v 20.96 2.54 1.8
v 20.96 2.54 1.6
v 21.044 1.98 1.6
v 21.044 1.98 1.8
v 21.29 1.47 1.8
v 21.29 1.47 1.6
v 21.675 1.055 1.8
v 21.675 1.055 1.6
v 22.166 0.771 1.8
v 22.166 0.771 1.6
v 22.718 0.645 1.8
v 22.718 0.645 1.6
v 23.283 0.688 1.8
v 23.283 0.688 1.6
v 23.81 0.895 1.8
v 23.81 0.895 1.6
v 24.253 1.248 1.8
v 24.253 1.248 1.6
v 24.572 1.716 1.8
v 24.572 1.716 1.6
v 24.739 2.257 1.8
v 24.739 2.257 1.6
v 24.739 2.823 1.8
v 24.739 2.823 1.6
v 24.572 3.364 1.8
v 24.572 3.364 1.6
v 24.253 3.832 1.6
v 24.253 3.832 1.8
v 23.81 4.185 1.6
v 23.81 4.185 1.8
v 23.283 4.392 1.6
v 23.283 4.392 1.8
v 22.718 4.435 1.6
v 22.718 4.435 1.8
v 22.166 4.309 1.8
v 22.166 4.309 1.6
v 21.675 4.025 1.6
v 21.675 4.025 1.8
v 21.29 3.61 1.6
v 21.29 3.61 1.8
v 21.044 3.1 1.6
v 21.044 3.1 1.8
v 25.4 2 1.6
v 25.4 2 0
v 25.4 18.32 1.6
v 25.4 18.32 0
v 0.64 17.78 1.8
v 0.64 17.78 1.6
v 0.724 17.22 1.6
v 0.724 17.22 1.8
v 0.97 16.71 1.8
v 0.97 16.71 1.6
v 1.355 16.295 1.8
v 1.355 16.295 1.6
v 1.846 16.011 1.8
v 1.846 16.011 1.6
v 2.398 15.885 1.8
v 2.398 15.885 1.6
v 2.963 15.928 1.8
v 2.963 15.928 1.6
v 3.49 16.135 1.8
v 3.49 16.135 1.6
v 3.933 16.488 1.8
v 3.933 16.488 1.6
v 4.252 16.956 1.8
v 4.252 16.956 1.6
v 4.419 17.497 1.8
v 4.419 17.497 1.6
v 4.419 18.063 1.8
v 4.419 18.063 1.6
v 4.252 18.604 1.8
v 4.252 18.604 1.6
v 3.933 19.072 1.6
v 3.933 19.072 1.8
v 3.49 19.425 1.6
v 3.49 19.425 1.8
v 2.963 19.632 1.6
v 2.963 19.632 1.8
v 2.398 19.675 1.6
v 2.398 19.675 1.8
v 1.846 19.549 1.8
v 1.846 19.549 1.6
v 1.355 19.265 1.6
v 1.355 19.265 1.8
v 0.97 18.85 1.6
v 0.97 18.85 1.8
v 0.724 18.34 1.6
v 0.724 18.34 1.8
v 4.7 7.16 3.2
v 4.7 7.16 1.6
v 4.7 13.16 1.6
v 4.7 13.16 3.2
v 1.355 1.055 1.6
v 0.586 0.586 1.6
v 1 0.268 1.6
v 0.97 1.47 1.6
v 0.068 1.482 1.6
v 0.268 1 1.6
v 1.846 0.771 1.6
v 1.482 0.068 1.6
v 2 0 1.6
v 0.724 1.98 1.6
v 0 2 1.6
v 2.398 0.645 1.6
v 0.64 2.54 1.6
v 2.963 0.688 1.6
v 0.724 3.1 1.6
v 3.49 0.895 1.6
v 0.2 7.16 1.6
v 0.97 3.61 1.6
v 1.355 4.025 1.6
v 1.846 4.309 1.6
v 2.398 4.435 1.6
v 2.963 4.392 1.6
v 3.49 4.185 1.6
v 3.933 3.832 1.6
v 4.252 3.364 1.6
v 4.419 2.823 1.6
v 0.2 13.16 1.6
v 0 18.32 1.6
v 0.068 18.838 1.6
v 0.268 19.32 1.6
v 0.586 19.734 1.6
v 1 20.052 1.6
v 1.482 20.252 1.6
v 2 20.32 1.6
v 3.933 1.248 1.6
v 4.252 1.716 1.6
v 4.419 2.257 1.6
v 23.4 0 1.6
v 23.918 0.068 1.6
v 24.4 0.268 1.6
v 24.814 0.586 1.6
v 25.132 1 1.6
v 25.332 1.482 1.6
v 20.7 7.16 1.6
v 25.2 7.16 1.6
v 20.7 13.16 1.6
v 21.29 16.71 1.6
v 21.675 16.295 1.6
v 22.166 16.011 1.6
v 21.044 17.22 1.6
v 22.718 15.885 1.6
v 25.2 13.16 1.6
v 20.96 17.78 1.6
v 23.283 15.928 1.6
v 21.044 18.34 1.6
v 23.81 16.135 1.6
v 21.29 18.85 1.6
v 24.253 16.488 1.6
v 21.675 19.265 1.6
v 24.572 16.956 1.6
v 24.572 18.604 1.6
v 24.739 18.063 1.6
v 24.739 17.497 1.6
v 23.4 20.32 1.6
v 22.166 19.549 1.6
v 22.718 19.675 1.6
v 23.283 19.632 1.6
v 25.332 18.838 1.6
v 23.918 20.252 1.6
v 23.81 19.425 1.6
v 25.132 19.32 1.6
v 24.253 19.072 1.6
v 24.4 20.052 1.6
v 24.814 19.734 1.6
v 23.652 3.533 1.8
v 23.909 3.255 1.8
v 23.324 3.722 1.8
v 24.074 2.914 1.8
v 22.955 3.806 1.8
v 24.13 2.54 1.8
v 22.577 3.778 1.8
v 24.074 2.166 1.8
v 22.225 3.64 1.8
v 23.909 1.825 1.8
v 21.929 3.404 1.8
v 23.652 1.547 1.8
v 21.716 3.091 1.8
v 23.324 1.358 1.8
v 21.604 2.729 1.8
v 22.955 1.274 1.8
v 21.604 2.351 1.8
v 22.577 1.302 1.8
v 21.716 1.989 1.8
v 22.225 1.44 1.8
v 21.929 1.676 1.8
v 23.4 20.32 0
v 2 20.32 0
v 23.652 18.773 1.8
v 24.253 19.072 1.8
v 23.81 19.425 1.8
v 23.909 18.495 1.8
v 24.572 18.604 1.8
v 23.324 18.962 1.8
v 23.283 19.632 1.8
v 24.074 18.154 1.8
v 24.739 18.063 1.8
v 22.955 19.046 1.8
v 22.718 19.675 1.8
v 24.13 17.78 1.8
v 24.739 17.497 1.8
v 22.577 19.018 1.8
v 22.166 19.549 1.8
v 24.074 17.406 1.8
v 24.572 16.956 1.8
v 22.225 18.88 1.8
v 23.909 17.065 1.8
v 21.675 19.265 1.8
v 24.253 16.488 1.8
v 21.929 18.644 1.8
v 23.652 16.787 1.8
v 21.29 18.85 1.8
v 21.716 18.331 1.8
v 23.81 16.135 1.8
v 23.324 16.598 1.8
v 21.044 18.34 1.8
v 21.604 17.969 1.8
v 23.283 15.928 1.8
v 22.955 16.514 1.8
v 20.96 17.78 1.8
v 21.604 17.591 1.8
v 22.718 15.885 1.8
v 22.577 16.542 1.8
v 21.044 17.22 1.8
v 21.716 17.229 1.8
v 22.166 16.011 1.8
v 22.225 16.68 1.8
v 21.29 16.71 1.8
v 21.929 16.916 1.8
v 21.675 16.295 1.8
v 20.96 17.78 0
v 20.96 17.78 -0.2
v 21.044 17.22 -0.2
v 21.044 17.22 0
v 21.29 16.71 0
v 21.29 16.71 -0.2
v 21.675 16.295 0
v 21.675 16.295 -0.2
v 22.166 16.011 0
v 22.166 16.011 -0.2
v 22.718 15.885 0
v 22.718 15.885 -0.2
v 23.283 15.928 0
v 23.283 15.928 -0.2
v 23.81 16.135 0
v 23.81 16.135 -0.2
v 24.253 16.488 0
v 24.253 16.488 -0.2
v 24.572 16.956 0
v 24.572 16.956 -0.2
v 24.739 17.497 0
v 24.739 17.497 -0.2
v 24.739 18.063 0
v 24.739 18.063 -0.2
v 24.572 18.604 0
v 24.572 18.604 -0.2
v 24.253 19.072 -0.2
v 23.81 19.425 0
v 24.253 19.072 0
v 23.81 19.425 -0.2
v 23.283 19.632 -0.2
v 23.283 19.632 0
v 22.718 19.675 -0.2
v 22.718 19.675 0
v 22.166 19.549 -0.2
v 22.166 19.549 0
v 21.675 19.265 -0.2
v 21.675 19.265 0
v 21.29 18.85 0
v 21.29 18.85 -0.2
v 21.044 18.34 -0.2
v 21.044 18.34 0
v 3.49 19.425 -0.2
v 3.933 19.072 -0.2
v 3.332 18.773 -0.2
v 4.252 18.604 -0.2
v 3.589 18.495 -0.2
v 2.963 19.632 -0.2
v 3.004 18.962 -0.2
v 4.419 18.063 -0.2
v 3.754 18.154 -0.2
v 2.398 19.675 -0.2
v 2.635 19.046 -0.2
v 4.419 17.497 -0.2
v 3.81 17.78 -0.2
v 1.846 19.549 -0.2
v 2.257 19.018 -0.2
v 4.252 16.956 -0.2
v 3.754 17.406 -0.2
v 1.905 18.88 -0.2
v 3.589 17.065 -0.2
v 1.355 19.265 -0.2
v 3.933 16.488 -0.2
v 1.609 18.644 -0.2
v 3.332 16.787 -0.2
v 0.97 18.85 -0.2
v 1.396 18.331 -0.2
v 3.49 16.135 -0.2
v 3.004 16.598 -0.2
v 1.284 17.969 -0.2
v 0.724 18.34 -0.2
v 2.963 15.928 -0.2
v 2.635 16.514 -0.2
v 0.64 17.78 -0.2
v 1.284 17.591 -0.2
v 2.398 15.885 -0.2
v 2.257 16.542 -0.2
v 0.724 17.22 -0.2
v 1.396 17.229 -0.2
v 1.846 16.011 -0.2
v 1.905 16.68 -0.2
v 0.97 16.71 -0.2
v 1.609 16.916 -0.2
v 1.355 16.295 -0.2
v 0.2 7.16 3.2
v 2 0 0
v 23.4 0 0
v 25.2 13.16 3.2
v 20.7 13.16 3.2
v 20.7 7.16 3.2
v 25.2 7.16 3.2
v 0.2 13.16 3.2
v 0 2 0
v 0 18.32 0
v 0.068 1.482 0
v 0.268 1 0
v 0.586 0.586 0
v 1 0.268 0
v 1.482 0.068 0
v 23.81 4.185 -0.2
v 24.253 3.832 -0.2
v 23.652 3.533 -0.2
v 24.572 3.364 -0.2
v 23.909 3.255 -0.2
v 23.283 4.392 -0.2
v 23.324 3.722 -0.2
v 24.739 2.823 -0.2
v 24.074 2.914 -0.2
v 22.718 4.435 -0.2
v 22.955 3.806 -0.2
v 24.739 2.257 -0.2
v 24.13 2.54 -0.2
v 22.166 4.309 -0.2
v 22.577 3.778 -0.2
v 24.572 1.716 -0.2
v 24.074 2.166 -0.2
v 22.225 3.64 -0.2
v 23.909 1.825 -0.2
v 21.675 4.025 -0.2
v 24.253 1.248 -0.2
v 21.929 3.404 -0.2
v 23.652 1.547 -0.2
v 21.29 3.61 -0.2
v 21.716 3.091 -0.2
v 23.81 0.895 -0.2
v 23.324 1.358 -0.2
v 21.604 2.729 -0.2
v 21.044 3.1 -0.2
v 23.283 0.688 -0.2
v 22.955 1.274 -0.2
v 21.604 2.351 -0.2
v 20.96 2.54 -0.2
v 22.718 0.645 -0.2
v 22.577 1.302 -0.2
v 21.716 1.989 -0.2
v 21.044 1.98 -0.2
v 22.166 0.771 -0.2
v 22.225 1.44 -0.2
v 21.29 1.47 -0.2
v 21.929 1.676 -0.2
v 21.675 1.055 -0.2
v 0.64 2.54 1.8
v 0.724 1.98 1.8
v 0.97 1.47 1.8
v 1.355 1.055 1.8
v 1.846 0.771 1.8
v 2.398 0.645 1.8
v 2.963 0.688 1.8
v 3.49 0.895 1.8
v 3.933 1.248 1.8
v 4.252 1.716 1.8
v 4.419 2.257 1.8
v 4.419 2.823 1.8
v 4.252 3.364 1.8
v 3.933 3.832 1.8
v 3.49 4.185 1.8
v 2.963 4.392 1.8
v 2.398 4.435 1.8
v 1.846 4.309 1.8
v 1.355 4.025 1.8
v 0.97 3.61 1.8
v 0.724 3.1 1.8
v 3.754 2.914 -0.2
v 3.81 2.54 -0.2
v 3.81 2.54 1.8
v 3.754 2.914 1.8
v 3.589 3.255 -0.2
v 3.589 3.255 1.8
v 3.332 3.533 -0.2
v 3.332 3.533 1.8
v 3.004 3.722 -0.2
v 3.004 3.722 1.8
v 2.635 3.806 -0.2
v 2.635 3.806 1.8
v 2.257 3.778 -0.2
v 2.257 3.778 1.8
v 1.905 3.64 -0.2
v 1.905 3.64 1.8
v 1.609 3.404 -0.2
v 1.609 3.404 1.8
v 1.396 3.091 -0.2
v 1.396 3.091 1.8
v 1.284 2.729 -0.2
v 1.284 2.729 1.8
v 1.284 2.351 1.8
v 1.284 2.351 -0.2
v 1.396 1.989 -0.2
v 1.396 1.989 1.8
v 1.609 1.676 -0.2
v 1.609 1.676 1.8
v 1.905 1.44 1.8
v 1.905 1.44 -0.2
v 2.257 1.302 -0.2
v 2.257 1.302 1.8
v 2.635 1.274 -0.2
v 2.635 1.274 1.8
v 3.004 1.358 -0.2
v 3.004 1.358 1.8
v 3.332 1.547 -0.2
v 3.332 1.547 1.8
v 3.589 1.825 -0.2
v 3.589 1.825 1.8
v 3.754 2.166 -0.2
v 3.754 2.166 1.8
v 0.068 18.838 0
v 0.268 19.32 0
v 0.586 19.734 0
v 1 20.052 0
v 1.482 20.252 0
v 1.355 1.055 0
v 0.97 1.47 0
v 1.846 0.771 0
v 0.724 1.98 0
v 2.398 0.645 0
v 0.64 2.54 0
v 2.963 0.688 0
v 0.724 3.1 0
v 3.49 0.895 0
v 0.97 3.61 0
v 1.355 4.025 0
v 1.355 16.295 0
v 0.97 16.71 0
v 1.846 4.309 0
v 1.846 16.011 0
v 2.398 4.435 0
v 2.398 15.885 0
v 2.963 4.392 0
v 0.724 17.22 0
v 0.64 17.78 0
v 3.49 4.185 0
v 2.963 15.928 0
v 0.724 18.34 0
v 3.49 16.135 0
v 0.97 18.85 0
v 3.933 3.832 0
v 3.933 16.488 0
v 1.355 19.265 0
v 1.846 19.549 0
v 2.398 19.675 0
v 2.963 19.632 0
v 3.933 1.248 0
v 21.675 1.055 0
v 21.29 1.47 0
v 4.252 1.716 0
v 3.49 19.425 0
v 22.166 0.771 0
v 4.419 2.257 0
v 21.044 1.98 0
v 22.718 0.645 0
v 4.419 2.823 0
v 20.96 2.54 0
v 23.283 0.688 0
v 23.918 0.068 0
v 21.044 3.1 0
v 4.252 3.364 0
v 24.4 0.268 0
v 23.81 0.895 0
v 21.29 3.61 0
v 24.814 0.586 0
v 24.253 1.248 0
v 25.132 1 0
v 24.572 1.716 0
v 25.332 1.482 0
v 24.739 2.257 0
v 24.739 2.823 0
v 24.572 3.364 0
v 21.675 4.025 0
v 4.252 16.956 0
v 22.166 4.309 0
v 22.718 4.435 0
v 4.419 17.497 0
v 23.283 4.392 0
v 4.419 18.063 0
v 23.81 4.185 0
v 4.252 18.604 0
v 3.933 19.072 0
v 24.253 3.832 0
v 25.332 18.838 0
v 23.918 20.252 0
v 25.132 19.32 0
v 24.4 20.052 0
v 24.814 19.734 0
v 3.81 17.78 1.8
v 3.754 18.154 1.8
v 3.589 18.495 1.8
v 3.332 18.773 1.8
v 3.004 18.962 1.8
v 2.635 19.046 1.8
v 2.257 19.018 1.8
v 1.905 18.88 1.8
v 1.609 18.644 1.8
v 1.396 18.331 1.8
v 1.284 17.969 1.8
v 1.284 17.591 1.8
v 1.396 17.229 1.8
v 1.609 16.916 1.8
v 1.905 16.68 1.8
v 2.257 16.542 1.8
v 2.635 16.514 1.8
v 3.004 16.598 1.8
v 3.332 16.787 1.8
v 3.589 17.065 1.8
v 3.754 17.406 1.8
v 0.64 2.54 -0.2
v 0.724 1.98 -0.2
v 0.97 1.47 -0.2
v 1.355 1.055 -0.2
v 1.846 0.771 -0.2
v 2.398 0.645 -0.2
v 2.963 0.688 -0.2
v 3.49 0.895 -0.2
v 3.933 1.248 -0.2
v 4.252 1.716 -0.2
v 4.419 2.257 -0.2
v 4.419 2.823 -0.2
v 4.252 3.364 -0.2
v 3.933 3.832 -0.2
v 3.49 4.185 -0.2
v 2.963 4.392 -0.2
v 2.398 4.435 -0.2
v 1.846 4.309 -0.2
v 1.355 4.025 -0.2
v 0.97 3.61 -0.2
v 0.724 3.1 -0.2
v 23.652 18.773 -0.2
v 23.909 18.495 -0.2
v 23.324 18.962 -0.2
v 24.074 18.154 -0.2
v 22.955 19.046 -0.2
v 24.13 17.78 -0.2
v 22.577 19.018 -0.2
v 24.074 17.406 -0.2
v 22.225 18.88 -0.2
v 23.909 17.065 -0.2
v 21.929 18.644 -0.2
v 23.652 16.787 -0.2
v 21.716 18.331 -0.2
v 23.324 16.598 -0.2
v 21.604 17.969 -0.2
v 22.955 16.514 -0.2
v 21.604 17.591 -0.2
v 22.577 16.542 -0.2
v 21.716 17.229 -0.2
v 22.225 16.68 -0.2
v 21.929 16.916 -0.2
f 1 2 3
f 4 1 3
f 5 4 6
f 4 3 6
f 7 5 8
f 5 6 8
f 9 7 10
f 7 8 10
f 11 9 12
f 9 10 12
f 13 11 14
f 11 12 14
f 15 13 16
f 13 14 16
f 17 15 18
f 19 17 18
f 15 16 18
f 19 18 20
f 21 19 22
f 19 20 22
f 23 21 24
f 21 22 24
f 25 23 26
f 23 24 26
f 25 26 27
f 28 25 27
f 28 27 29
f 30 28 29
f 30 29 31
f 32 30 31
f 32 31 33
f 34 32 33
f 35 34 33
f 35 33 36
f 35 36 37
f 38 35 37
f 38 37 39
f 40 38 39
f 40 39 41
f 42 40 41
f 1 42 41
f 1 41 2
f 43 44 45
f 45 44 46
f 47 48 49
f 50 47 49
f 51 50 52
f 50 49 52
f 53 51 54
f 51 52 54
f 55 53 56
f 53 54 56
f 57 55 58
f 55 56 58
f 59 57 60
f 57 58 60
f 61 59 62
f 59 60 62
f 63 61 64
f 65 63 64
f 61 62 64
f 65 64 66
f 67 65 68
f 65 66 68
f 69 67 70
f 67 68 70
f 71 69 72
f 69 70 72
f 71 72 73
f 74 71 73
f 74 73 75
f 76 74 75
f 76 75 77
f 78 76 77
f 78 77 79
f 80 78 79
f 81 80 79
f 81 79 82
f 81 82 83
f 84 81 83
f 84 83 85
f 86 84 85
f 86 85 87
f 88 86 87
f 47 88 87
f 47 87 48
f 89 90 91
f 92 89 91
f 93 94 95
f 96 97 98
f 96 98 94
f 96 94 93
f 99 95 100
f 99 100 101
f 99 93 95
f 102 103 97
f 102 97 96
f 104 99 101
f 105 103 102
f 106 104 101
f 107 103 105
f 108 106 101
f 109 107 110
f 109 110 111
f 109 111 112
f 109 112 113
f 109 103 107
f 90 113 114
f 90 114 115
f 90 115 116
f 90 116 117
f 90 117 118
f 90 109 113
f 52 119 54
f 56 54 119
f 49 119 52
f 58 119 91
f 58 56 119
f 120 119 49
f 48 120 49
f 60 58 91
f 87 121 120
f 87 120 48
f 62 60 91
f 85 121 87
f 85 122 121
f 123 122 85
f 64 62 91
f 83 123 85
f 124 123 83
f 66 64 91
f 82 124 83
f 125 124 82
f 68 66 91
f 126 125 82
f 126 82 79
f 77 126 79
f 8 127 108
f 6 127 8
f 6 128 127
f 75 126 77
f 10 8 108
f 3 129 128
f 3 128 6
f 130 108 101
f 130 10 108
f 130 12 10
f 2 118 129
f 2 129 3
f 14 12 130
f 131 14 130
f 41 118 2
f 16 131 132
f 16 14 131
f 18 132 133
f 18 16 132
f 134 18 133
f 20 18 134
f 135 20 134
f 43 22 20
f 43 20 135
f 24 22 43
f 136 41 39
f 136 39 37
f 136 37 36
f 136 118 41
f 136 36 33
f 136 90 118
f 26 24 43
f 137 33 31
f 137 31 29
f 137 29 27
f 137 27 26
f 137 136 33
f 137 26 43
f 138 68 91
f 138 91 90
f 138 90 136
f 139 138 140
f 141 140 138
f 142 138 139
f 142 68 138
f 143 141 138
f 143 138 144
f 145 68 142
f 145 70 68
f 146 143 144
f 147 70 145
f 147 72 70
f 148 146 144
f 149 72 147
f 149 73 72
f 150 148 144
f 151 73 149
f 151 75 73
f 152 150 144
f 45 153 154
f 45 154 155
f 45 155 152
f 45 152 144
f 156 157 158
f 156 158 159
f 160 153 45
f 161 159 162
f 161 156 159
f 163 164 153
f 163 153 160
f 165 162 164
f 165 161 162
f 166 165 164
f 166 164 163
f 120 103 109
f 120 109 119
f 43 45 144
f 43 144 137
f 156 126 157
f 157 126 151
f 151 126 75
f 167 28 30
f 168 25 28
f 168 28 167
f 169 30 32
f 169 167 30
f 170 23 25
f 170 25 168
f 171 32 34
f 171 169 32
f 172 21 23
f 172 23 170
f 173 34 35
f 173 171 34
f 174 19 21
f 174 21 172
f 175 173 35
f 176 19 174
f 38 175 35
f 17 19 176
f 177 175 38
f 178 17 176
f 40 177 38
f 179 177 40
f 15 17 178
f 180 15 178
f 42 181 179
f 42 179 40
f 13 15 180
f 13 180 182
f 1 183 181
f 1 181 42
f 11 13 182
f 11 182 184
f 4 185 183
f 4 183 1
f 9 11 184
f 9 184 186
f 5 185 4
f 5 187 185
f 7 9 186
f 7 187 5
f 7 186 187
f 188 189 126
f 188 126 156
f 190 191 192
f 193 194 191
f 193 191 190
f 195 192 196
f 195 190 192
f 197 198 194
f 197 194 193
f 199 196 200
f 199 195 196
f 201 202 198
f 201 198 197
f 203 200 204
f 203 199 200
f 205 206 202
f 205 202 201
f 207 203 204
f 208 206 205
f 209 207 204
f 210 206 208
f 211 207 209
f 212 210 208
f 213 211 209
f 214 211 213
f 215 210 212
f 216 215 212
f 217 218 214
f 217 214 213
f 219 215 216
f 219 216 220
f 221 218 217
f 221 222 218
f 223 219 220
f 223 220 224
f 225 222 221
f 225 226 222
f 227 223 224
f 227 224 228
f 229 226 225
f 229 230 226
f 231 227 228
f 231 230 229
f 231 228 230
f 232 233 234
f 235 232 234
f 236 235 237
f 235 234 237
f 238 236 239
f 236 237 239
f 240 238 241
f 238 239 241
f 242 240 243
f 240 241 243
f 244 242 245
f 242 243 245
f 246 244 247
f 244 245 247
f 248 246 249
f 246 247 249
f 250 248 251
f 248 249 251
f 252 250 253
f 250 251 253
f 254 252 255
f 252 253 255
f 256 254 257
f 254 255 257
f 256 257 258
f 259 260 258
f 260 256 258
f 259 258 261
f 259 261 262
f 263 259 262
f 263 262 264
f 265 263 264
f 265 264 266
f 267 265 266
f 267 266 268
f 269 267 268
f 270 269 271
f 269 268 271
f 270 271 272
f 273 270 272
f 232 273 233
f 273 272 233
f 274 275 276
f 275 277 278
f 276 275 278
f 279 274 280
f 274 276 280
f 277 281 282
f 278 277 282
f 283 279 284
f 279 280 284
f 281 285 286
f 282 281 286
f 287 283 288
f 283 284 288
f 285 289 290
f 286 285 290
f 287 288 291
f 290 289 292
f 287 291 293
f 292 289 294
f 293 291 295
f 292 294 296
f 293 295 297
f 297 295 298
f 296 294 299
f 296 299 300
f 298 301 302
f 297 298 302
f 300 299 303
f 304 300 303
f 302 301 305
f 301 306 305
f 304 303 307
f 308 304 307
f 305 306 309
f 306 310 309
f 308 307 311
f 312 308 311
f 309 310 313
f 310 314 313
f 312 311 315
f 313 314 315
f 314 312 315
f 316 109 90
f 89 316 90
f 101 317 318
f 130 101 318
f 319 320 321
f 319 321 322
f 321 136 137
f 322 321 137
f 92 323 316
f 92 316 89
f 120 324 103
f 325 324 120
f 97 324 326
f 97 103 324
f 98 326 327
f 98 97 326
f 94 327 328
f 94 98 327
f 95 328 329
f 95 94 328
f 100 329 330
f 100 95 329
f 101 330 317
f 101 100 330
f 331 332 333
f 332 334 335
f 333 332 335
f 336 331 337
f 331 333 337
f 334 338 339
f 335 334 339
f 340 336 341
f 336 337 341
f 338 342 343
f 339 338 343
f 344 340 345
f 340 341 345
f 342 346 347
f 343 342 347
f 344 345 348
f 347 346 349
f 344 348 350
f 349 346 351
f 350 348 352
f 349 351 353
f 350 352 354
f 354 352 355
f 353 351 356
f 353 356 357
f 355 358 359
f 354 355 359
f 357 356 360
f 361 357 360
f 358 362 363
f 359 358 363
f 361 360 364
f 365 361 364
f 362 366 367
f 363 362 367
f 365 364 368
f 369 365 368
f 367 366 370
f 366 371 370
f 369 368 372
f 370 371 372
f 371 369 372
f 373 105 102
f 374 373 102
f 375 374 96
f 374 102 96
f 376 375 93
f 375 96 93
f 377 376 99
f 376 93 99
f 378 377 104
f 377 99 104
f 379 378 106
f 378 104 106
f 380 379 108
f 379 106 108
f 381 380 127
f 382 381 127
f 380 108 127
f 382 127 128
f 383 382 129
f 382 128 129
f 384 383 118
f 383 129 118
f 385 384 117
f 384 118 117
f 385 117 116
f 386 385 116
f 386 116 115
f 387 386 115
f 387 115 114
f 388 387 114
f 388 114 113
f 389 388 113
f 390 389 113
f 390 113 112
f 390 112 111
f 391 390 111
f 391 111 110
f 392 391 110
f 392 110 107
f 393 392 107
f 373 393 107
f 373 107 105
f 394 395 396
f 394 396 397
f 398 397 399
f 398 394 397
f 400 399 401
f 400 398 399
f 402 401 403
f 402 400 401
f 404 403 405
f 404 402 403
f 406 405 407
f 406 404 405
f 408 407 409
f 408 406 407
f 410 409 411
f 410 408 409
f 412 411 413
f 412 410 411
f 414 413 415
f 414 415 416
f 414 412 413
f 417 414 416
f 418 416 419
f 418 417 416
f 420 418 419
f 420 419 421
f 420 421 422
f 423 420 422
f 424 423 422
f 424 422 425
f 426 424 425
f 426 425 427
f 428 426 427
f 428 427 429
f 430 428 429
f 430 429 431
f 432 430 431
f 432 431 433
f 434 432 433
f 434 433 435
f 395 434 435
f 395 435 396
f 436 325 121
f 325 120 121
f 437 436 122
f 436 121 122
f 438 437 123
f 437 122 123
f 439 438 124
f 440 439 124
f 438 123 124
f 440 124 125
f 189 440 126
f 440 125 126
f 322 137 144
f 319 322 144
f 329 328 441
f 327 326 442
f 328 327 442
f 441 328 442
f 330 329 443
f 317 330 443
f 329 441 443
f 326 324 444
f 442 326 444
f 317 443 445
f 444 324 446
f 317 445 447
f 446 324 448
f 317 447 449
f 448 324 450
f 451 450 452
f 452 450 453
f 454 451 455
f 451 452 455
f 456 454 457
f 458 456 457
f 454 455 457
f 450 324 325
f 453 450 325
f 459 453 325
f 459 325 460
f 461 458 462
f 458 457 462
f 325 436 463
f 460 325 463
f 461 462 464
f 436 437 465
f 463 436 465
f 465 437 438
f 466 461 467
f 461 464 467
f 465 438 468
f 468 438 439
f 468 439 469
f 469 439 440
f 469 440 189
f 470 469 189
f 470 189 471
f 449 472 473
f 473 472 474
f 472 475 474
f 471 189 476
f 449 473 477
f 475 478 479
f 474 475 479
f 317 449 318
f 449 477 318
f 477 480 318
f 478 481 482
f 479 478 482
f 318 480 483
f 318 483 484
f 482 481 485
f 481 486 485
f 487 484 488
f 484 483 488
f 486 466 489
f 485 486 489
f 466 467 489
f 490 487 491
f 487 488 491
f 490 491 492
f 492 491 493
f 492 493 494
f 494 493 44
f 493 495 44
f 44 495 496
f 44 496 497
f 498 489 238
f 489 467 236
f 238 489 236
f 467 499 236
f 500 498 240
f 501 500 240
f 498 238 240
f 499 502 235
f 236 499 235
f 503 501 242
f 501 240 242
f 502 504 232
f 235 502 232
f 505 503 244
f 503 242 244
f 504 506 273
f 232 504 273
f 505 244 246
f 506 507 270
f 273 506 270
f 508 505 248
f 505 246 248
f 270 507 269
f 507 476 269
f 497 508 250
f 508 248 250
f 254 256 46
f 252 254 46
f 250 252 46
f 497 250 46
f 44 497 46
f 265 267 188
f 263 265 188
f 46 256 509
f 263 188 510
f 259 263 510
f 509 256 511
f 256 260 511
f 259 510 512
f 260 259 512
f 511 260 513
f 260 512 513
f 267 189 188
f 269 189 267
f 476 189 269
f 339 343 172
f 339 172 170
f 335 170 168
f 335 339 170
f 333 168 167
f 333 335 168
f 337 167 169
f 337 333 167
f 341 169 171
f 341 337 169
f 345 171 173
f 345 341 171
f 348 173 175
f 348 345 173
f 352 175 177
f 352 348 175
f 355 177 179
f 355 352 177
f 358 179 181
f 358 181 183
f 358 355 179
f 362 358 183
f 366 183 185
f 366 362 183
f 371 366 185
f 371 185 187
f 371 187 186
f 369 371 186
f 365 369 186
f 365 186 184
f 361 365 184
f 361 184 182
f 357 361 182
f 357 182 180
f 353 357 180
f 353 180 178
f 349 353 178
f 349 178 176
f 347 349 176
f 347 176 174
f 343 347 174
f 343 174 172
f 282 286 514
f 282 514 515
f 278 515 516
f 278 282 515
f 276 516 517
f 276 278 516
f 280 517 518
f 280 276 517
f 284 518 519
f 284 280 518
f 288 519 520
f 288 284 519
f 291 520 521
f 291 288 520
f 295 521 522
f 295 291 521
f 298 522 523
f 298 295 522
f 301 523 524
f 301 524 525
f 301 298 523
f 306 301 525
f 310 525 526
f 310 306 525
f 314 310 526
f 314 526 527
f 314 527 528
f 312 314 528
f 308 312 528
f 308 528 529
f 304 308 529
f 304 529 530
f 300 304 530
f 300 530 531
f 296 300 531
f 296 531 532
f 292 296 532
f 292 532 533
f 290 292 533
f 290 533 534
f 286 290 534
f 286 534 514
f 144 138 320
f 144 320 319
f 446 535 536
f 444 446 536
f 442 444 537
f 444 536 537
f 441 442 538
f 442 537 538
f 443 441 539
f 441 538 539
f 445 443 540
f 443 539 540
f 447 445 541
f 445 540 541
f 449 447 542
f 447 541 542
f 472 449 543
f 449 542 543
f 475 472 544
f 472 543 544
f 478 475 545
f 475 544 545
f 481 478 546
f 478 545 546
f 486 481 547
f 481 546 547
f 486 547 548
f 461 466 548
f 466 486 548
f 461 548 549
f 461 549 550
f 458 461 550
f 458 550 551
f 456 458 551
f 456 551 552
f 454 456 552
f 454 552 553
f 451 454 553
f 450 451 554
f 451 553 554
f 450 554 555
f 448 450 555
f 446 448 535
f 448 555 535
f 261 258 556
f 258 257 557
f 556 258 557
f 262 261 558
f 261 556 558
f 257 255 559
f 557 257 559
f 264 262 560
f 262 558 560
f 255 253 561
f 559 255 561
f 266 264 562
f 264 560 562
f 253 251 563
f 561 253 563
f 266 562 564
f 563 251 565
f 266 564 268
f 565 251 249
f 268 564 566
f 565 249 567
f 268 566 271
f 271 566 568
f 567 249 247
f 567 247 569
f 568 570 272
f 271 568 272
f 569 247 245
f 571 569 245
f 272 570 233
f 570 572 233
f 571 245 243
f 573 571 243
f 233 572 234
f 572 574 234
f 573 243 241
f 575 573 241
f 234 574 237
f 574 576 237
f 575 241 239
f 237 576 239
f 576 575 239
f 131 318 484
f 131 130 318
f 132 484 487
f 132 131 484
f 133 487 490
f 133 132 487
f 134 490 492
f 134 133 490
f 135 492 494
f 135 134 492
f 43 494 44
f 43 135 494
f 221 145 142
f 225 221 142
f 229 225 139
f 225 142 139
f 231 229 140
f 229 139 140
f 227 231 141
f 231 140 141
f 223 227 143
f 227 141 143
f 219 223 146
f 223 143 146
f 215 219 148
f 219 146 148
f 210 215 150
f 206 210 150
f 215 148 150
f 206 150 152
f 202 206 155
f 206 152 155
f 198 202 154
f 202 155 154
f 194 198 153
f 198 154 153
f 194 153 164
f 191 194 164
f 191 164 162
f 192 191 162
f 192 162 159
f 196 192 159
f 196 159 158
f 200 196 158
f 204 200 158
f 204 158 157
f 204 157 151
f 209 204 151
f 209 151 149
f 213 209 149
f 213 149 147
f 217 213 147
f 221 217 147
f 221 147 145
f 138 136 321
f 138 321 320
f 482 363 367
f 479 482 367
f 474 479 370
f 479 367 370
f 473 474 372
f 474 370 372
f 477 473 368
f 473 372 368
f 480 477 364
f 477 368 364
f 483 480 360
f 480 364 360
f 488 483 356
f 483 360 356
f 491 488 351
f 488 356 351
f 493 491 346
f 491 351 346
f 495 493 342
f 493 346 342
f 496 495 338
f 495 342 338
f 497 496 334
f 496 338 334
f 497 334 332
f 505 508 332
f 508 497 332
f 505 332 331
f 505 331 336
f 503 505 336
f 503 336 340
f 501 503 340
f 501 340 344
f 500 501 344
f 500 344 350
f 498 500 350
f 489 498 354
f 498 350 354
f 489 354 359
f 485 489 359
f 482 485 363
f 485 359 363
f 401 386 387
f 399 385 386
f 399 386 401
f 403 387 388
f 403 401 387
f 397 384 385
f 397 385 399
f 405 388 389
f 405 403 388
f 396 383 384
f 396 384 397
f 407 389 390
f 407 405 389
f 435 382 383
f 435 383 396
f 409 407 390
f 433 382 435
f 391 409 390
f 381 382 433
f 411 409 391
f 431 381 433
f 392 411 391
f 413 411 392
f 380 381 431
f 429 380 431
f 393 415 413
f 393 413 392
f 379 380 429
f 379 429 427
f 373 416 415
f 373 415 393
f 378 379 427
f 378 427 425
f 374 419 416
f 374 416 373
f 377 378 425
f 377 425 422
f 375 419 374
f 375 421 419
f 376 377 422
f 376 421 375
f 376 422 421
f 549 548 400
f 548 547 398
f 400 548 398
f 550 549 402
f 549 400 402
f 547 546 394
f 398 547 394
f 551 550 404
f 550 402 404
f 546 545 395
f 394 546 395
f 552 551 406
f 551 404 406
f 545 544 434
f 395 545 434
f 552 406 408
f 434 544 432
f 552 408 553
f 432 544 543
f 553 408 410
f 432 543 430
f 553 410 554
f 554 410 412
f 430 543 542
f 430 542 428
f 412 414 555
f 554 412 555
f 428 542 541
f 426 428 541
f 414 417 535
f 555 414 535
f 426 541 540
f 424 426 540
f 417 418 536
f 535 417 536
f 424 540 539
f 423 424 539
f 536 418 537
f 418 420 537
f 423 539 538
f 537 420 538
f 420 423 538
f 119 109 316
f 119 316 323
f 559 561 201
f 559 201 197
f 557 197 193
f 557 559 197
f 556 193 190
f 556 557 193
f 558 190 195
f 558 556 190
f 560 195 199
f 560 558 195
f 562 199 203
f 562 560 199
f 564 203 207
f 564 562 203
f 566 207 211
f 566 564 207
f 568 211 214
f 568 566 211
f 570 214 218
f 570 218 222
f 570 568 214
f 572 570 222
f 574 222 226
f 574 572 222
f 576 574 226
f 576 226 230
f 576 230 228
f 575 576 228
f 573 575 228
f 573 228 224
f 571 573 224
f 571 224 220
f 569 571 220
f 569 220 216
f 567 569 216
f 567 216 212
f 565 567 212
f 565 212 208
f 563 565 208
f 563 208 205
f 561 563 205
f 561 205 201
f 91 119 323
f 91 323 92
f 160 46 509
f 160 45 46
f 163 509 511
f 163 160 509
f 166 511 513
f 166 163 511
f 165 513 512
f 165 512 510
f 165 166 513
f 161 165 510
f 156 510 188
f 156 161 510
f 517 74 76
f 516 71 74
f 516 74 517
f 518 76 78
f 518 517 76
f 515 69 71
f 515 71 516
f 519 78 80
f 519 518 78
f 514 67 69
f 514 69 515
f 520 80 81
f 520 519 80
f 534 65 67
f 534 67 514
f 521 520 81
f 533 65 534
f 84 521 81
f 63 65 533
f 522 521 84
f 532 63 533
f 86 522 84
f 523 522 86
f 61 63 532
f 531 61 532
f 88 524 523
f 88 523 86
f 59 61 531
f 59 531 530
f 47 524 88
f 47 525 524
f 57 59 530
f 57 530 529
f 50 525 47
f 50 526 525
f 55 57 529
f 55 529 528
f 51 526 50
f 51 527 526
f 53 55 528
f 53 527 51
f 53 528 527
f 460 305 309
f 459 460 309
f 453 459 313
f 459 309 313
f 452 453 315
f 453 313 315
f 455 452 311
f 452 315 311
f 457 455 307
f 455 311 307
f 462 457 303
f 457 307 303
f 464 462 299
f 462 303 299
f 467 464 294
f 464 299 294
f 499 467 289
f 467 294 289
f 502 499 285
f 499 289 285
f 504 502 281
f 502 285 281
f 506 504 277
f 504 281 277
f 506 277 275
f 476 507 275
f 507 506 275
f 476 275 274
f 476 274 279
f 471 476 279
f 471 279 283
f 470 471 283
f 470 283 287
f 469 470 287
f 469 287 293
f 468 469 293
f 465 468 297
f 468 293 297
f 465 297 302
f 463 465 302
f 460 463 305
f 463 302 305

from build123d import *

# Parameters (mm, degrees)
SKETCH1_W           = 25.4
SKETCH1_H           = 20.32
BOSS_EXTRUDE1_DEPTH = 1.6
FILLET1_R           = 2
SKETCH2_R           = 1.27
CUT_EXTRUDE1_DEPTH  = 33.567198222
BOSS_EXTRUDE4_START = -0.2
SKETCH5_R           = 1.9
SKETCH5_R_2         = 1.27
BOSS_EXTRUDE4_DEPTH = 2
BOSS_EXTRUDE3_START = 1.6
SKETCH4_W           = 4.5
SKETCH4_H           = 6
BOSS_EXTRUDE3_DEPTH = 1.6


with BuildPart() as part:
    # Sketch1 → Boss-Extrude1 (new body)
    with BuildSketch(Plane.XY):
        with Locations((12.7, 10.16)):
            Rectangle(SKETCH1_W, SKETCH1_H)
    extrude(amount=BOSS_EXTRUDE1_DEPTH)

    # Fillet1
    fillet1_edges = [part.edges().sort_by_distance(p)[0] for p in [
        (0, 20.32, 0.8),
        (25.4, 20.32, 0.8),
        (25.4, 0, 0.8),
        (0, 0, 0.8),
    ]]
    fillet(fillet1_edges, radius=FILLET1_R)

    # Sketch2 → Cut-Extrude1 (cut, through all)
    with BuildSketch(Plane.XY):
        with Locations((2.54, 17.78)):
            Circle(SKETCH2_R)
        with Locations((22.86, 17.78)):
            Circle(SKETCH2_R)
        with Locations((22.86, 2.54)):
            Circle(SKETCH2_R)
        with Locations((2.54, 2.54)):
            Circle(SKETCH2_R)
    extrude(amount=CUT_EXTRUDE1_DEPTH, mode=Mode.SUBTRACT)

    # Sketch5 → Boss-Extrude4 (add)
    # profile 1 of 4: a face of its own
    with BuildSketch(Plane.XY.offset(BOSS_EXTRUDE4_START)):
        with Locations(Location((2.54, 17.78, 0), (0, 0, 180))):
            Circle(SKETCH5_R)
        with Locations((2.54, 17.78)):
            Circle(SKETCH5_R_2, mode=Mode.SUBTRACT)
    # profile 2 of 4: a face of its own
    with BuildSketch(Plane.XY.offset(BOSS_EXTRUDE4_START)):
        with Locations(Location((22.86, 17.78, 0), (0, 0, 180))):
            Circle(SKETCH5_R)
        with Locations((22.86, 17.78)):
            Circle(SKETCH5_R_2, mode=Mode.SUBTRACT)
    # profile 3 of 4: a face of its own
    with BuildSketch(Plane.XY.offset(BOSS_EXTRUDE4_START)):
        with Locations(Location((22.86, 2.54, 0), (0, 0, 180))):
            Circle(SKETCH5_R)
        with Locations((22.86, 2.54)):
            Circle(SKETCH5_R_2, mode=Mode.SUBTRACT)
    # profile 4 of 4: a face of its own
    with BuildSketch(Plane.XY.offset(BOSS_EXTRUDE4_START)):
        with Locations(Location((2.54, 2.54, 0), (0, 0, 180))):
            Circle(SKETCH5_R)
        with Locations((2.54, 2.54)):
            Circle(SKETCH5_R_2, mode=Mode.SUBTRACT)
    extrude(amount=BOSS_EXTRUDE4_DEPTH)

    # Sketch4 → Boss-Extrude3 (add)
    with BuildSketch(Plane.XY.offset(BOSS_EXTRUDE3_START)):
        with Locations((2.45, 10.16)):
            Rectangle(SKETCH4_W, SKETCH4_H)
        with Locations((22.95, 10.16)):
            Rectangle(SKETCH4_W, SKETCH4_H)
    extrude(amount=BOSS_EXTRUDE3_DEPTH)


solid = part.part
